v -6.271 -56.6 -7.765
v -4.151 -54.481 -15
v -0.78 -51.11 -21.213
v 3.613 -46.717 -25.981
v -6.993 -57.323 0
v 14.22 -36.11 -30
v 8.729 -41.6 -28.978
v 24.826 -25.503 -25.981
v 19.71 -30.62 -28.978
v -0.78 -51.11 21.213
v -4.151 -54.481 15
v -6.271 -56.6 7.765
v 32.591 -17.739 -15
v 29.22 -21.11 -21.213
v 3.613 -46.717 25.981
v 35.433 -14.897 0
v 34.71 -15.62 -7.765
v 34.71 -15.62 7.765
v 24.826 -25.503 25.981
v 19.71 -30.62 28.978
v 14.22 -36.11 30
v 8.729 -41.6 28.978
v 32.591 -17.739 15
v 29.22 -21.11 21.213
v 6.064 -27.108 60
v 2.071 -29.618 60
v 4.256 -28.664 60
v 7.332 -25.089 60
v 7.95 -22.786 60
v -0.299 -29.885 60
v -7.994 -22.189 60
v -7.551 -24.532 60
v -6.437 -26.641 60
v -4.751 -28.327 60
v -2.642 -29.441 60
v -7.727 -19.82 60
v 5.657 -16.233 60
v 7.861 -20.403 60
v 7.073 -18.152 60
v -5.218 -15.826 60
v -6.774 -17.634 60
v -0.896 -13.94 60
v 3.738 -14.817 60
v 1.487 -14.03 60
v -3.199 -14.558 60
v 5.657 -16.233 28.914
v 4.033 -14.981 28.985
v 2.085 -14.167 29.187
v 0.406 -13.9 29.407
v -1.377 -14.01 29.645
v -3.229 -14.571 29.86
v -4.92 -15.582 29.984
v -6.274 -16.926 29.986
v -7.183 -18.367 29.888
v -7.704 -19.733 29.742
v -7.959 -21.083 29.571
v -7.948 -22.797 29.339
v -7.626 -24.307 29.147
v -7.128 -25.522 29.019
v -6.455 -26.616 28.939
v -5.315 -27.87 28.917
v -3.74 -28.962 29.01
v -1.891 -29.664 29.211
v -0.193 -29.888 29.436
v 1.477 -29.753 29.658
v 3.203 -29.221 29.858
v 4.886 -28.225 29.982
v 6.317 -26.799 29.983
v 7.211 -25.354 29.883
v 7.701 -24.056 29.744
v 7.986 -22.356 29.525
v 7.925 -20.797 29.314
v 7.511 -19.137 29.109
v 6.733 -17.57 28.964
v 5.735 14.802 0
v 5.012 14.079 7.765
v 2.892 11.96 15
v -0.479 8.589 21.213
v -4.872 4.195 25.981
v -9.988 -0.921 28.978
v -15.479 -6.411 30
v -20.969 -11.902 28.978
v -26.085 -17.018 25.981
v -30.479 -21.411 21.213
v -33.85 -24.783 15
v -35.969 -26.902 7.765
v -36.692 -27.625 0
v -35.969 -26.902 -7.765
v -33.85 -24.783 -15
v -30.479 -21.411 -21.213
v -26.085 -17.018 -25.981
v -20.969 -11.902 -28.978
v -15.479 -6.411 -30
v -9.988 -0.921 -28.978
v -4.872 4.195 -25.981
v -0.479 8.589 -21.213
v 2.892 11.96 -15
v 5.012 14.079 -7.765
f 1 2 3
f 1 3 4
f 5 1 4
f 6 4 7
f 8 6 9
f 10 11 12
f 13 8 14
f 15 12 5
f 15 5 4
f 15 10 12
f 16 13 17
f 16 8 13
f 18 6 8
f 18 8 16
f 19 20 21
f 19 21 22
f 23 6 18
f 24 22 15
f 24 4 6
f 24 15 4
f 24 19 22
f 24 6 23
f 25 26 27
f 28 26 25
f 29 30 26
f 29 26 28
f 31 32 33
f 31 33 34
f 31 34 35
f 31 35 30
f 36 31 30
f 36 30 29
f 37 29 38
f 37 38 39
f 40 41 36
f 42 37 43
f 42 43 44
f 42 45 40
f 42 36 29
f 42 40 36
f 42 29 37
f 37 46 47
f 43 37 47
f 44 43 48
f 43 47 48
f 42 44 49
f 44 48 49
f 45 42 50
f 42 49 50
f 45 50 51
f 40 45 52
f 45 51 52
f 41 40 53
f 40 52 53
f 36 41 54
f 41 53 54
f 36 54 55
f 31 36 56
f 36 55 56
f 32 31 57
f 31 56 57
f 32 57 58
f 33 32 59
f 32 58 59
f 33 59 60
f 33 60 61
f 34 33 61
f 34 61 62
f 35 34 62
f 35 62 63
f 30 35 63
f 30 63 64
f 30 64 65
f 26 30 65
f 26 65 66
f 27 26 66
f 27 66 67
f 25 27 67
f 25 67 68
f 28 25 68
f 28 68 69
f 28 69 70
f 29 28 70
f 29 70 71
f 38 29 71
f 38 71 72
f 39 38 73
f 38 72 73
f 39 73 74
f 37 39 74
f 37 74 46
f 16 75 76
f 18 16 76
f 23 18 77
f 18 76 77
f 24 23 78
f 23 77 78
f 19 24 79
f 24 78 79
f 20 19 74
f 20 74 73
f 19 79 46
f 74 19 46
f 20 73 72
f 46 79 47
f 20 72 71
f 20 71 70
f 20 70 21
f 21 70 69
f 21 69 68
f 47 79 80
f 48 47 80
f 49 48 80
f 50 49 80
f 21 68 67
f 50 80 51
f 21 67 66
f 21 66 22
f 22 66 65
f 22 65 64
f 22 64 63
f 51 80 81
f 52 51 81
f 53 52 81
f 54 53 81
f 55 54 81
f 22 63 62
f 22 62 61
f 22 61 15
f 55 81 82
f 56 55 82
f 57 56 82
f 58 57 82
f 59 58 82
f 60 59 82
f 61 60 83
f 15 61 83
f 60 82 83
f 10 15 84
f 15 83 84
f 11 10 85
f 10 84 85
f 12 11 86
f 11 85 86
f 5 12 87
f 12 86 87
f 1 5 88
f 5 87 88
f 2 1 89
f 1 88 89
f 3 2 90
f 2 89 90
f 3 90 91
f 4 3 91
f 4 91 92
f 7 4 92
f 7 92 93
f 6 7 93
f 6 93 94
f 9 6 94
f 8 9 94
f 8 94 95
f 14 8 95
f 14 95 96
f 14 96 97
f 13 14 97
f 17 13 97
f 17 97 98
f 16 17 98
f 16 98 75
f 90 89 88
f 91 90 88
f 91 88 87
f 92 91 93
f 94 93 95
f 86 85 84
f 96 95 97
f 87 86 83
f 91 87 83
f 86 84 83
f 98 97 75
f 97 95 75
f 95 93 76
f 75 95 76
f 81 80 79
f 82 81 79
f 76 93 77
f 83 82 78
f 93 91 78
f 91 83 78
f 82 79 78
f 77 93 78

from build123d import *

# Parameters (mm, degrees)
F0_R     = 30
F1_DEPTH = 42
F2_R     = 8
F3_DEPTH = 60
F4_ANGLE = 45


with BuildPart() as f1:
    # F0 (on Front) → F1 (new body)
    with BuildSketch(Plane.XZ):
        Circle(F0_R)
    extrude(amount=F1_DEPTH)

    # F2 (on Top) → F3 (join)
    with BuildSketch(Plane.XY):
        with Locations((0, -21.890162)):
            Circle(F2_R)
    extrude(amount=F3_DEPTH)


with BuildPart() as f1_1:
    # F4: moved
    add(f1.part.rotate(Axis((0, -21.890162, 60), (0, 0, 1)), F4_ANGLE))


solid = f1_1.part
